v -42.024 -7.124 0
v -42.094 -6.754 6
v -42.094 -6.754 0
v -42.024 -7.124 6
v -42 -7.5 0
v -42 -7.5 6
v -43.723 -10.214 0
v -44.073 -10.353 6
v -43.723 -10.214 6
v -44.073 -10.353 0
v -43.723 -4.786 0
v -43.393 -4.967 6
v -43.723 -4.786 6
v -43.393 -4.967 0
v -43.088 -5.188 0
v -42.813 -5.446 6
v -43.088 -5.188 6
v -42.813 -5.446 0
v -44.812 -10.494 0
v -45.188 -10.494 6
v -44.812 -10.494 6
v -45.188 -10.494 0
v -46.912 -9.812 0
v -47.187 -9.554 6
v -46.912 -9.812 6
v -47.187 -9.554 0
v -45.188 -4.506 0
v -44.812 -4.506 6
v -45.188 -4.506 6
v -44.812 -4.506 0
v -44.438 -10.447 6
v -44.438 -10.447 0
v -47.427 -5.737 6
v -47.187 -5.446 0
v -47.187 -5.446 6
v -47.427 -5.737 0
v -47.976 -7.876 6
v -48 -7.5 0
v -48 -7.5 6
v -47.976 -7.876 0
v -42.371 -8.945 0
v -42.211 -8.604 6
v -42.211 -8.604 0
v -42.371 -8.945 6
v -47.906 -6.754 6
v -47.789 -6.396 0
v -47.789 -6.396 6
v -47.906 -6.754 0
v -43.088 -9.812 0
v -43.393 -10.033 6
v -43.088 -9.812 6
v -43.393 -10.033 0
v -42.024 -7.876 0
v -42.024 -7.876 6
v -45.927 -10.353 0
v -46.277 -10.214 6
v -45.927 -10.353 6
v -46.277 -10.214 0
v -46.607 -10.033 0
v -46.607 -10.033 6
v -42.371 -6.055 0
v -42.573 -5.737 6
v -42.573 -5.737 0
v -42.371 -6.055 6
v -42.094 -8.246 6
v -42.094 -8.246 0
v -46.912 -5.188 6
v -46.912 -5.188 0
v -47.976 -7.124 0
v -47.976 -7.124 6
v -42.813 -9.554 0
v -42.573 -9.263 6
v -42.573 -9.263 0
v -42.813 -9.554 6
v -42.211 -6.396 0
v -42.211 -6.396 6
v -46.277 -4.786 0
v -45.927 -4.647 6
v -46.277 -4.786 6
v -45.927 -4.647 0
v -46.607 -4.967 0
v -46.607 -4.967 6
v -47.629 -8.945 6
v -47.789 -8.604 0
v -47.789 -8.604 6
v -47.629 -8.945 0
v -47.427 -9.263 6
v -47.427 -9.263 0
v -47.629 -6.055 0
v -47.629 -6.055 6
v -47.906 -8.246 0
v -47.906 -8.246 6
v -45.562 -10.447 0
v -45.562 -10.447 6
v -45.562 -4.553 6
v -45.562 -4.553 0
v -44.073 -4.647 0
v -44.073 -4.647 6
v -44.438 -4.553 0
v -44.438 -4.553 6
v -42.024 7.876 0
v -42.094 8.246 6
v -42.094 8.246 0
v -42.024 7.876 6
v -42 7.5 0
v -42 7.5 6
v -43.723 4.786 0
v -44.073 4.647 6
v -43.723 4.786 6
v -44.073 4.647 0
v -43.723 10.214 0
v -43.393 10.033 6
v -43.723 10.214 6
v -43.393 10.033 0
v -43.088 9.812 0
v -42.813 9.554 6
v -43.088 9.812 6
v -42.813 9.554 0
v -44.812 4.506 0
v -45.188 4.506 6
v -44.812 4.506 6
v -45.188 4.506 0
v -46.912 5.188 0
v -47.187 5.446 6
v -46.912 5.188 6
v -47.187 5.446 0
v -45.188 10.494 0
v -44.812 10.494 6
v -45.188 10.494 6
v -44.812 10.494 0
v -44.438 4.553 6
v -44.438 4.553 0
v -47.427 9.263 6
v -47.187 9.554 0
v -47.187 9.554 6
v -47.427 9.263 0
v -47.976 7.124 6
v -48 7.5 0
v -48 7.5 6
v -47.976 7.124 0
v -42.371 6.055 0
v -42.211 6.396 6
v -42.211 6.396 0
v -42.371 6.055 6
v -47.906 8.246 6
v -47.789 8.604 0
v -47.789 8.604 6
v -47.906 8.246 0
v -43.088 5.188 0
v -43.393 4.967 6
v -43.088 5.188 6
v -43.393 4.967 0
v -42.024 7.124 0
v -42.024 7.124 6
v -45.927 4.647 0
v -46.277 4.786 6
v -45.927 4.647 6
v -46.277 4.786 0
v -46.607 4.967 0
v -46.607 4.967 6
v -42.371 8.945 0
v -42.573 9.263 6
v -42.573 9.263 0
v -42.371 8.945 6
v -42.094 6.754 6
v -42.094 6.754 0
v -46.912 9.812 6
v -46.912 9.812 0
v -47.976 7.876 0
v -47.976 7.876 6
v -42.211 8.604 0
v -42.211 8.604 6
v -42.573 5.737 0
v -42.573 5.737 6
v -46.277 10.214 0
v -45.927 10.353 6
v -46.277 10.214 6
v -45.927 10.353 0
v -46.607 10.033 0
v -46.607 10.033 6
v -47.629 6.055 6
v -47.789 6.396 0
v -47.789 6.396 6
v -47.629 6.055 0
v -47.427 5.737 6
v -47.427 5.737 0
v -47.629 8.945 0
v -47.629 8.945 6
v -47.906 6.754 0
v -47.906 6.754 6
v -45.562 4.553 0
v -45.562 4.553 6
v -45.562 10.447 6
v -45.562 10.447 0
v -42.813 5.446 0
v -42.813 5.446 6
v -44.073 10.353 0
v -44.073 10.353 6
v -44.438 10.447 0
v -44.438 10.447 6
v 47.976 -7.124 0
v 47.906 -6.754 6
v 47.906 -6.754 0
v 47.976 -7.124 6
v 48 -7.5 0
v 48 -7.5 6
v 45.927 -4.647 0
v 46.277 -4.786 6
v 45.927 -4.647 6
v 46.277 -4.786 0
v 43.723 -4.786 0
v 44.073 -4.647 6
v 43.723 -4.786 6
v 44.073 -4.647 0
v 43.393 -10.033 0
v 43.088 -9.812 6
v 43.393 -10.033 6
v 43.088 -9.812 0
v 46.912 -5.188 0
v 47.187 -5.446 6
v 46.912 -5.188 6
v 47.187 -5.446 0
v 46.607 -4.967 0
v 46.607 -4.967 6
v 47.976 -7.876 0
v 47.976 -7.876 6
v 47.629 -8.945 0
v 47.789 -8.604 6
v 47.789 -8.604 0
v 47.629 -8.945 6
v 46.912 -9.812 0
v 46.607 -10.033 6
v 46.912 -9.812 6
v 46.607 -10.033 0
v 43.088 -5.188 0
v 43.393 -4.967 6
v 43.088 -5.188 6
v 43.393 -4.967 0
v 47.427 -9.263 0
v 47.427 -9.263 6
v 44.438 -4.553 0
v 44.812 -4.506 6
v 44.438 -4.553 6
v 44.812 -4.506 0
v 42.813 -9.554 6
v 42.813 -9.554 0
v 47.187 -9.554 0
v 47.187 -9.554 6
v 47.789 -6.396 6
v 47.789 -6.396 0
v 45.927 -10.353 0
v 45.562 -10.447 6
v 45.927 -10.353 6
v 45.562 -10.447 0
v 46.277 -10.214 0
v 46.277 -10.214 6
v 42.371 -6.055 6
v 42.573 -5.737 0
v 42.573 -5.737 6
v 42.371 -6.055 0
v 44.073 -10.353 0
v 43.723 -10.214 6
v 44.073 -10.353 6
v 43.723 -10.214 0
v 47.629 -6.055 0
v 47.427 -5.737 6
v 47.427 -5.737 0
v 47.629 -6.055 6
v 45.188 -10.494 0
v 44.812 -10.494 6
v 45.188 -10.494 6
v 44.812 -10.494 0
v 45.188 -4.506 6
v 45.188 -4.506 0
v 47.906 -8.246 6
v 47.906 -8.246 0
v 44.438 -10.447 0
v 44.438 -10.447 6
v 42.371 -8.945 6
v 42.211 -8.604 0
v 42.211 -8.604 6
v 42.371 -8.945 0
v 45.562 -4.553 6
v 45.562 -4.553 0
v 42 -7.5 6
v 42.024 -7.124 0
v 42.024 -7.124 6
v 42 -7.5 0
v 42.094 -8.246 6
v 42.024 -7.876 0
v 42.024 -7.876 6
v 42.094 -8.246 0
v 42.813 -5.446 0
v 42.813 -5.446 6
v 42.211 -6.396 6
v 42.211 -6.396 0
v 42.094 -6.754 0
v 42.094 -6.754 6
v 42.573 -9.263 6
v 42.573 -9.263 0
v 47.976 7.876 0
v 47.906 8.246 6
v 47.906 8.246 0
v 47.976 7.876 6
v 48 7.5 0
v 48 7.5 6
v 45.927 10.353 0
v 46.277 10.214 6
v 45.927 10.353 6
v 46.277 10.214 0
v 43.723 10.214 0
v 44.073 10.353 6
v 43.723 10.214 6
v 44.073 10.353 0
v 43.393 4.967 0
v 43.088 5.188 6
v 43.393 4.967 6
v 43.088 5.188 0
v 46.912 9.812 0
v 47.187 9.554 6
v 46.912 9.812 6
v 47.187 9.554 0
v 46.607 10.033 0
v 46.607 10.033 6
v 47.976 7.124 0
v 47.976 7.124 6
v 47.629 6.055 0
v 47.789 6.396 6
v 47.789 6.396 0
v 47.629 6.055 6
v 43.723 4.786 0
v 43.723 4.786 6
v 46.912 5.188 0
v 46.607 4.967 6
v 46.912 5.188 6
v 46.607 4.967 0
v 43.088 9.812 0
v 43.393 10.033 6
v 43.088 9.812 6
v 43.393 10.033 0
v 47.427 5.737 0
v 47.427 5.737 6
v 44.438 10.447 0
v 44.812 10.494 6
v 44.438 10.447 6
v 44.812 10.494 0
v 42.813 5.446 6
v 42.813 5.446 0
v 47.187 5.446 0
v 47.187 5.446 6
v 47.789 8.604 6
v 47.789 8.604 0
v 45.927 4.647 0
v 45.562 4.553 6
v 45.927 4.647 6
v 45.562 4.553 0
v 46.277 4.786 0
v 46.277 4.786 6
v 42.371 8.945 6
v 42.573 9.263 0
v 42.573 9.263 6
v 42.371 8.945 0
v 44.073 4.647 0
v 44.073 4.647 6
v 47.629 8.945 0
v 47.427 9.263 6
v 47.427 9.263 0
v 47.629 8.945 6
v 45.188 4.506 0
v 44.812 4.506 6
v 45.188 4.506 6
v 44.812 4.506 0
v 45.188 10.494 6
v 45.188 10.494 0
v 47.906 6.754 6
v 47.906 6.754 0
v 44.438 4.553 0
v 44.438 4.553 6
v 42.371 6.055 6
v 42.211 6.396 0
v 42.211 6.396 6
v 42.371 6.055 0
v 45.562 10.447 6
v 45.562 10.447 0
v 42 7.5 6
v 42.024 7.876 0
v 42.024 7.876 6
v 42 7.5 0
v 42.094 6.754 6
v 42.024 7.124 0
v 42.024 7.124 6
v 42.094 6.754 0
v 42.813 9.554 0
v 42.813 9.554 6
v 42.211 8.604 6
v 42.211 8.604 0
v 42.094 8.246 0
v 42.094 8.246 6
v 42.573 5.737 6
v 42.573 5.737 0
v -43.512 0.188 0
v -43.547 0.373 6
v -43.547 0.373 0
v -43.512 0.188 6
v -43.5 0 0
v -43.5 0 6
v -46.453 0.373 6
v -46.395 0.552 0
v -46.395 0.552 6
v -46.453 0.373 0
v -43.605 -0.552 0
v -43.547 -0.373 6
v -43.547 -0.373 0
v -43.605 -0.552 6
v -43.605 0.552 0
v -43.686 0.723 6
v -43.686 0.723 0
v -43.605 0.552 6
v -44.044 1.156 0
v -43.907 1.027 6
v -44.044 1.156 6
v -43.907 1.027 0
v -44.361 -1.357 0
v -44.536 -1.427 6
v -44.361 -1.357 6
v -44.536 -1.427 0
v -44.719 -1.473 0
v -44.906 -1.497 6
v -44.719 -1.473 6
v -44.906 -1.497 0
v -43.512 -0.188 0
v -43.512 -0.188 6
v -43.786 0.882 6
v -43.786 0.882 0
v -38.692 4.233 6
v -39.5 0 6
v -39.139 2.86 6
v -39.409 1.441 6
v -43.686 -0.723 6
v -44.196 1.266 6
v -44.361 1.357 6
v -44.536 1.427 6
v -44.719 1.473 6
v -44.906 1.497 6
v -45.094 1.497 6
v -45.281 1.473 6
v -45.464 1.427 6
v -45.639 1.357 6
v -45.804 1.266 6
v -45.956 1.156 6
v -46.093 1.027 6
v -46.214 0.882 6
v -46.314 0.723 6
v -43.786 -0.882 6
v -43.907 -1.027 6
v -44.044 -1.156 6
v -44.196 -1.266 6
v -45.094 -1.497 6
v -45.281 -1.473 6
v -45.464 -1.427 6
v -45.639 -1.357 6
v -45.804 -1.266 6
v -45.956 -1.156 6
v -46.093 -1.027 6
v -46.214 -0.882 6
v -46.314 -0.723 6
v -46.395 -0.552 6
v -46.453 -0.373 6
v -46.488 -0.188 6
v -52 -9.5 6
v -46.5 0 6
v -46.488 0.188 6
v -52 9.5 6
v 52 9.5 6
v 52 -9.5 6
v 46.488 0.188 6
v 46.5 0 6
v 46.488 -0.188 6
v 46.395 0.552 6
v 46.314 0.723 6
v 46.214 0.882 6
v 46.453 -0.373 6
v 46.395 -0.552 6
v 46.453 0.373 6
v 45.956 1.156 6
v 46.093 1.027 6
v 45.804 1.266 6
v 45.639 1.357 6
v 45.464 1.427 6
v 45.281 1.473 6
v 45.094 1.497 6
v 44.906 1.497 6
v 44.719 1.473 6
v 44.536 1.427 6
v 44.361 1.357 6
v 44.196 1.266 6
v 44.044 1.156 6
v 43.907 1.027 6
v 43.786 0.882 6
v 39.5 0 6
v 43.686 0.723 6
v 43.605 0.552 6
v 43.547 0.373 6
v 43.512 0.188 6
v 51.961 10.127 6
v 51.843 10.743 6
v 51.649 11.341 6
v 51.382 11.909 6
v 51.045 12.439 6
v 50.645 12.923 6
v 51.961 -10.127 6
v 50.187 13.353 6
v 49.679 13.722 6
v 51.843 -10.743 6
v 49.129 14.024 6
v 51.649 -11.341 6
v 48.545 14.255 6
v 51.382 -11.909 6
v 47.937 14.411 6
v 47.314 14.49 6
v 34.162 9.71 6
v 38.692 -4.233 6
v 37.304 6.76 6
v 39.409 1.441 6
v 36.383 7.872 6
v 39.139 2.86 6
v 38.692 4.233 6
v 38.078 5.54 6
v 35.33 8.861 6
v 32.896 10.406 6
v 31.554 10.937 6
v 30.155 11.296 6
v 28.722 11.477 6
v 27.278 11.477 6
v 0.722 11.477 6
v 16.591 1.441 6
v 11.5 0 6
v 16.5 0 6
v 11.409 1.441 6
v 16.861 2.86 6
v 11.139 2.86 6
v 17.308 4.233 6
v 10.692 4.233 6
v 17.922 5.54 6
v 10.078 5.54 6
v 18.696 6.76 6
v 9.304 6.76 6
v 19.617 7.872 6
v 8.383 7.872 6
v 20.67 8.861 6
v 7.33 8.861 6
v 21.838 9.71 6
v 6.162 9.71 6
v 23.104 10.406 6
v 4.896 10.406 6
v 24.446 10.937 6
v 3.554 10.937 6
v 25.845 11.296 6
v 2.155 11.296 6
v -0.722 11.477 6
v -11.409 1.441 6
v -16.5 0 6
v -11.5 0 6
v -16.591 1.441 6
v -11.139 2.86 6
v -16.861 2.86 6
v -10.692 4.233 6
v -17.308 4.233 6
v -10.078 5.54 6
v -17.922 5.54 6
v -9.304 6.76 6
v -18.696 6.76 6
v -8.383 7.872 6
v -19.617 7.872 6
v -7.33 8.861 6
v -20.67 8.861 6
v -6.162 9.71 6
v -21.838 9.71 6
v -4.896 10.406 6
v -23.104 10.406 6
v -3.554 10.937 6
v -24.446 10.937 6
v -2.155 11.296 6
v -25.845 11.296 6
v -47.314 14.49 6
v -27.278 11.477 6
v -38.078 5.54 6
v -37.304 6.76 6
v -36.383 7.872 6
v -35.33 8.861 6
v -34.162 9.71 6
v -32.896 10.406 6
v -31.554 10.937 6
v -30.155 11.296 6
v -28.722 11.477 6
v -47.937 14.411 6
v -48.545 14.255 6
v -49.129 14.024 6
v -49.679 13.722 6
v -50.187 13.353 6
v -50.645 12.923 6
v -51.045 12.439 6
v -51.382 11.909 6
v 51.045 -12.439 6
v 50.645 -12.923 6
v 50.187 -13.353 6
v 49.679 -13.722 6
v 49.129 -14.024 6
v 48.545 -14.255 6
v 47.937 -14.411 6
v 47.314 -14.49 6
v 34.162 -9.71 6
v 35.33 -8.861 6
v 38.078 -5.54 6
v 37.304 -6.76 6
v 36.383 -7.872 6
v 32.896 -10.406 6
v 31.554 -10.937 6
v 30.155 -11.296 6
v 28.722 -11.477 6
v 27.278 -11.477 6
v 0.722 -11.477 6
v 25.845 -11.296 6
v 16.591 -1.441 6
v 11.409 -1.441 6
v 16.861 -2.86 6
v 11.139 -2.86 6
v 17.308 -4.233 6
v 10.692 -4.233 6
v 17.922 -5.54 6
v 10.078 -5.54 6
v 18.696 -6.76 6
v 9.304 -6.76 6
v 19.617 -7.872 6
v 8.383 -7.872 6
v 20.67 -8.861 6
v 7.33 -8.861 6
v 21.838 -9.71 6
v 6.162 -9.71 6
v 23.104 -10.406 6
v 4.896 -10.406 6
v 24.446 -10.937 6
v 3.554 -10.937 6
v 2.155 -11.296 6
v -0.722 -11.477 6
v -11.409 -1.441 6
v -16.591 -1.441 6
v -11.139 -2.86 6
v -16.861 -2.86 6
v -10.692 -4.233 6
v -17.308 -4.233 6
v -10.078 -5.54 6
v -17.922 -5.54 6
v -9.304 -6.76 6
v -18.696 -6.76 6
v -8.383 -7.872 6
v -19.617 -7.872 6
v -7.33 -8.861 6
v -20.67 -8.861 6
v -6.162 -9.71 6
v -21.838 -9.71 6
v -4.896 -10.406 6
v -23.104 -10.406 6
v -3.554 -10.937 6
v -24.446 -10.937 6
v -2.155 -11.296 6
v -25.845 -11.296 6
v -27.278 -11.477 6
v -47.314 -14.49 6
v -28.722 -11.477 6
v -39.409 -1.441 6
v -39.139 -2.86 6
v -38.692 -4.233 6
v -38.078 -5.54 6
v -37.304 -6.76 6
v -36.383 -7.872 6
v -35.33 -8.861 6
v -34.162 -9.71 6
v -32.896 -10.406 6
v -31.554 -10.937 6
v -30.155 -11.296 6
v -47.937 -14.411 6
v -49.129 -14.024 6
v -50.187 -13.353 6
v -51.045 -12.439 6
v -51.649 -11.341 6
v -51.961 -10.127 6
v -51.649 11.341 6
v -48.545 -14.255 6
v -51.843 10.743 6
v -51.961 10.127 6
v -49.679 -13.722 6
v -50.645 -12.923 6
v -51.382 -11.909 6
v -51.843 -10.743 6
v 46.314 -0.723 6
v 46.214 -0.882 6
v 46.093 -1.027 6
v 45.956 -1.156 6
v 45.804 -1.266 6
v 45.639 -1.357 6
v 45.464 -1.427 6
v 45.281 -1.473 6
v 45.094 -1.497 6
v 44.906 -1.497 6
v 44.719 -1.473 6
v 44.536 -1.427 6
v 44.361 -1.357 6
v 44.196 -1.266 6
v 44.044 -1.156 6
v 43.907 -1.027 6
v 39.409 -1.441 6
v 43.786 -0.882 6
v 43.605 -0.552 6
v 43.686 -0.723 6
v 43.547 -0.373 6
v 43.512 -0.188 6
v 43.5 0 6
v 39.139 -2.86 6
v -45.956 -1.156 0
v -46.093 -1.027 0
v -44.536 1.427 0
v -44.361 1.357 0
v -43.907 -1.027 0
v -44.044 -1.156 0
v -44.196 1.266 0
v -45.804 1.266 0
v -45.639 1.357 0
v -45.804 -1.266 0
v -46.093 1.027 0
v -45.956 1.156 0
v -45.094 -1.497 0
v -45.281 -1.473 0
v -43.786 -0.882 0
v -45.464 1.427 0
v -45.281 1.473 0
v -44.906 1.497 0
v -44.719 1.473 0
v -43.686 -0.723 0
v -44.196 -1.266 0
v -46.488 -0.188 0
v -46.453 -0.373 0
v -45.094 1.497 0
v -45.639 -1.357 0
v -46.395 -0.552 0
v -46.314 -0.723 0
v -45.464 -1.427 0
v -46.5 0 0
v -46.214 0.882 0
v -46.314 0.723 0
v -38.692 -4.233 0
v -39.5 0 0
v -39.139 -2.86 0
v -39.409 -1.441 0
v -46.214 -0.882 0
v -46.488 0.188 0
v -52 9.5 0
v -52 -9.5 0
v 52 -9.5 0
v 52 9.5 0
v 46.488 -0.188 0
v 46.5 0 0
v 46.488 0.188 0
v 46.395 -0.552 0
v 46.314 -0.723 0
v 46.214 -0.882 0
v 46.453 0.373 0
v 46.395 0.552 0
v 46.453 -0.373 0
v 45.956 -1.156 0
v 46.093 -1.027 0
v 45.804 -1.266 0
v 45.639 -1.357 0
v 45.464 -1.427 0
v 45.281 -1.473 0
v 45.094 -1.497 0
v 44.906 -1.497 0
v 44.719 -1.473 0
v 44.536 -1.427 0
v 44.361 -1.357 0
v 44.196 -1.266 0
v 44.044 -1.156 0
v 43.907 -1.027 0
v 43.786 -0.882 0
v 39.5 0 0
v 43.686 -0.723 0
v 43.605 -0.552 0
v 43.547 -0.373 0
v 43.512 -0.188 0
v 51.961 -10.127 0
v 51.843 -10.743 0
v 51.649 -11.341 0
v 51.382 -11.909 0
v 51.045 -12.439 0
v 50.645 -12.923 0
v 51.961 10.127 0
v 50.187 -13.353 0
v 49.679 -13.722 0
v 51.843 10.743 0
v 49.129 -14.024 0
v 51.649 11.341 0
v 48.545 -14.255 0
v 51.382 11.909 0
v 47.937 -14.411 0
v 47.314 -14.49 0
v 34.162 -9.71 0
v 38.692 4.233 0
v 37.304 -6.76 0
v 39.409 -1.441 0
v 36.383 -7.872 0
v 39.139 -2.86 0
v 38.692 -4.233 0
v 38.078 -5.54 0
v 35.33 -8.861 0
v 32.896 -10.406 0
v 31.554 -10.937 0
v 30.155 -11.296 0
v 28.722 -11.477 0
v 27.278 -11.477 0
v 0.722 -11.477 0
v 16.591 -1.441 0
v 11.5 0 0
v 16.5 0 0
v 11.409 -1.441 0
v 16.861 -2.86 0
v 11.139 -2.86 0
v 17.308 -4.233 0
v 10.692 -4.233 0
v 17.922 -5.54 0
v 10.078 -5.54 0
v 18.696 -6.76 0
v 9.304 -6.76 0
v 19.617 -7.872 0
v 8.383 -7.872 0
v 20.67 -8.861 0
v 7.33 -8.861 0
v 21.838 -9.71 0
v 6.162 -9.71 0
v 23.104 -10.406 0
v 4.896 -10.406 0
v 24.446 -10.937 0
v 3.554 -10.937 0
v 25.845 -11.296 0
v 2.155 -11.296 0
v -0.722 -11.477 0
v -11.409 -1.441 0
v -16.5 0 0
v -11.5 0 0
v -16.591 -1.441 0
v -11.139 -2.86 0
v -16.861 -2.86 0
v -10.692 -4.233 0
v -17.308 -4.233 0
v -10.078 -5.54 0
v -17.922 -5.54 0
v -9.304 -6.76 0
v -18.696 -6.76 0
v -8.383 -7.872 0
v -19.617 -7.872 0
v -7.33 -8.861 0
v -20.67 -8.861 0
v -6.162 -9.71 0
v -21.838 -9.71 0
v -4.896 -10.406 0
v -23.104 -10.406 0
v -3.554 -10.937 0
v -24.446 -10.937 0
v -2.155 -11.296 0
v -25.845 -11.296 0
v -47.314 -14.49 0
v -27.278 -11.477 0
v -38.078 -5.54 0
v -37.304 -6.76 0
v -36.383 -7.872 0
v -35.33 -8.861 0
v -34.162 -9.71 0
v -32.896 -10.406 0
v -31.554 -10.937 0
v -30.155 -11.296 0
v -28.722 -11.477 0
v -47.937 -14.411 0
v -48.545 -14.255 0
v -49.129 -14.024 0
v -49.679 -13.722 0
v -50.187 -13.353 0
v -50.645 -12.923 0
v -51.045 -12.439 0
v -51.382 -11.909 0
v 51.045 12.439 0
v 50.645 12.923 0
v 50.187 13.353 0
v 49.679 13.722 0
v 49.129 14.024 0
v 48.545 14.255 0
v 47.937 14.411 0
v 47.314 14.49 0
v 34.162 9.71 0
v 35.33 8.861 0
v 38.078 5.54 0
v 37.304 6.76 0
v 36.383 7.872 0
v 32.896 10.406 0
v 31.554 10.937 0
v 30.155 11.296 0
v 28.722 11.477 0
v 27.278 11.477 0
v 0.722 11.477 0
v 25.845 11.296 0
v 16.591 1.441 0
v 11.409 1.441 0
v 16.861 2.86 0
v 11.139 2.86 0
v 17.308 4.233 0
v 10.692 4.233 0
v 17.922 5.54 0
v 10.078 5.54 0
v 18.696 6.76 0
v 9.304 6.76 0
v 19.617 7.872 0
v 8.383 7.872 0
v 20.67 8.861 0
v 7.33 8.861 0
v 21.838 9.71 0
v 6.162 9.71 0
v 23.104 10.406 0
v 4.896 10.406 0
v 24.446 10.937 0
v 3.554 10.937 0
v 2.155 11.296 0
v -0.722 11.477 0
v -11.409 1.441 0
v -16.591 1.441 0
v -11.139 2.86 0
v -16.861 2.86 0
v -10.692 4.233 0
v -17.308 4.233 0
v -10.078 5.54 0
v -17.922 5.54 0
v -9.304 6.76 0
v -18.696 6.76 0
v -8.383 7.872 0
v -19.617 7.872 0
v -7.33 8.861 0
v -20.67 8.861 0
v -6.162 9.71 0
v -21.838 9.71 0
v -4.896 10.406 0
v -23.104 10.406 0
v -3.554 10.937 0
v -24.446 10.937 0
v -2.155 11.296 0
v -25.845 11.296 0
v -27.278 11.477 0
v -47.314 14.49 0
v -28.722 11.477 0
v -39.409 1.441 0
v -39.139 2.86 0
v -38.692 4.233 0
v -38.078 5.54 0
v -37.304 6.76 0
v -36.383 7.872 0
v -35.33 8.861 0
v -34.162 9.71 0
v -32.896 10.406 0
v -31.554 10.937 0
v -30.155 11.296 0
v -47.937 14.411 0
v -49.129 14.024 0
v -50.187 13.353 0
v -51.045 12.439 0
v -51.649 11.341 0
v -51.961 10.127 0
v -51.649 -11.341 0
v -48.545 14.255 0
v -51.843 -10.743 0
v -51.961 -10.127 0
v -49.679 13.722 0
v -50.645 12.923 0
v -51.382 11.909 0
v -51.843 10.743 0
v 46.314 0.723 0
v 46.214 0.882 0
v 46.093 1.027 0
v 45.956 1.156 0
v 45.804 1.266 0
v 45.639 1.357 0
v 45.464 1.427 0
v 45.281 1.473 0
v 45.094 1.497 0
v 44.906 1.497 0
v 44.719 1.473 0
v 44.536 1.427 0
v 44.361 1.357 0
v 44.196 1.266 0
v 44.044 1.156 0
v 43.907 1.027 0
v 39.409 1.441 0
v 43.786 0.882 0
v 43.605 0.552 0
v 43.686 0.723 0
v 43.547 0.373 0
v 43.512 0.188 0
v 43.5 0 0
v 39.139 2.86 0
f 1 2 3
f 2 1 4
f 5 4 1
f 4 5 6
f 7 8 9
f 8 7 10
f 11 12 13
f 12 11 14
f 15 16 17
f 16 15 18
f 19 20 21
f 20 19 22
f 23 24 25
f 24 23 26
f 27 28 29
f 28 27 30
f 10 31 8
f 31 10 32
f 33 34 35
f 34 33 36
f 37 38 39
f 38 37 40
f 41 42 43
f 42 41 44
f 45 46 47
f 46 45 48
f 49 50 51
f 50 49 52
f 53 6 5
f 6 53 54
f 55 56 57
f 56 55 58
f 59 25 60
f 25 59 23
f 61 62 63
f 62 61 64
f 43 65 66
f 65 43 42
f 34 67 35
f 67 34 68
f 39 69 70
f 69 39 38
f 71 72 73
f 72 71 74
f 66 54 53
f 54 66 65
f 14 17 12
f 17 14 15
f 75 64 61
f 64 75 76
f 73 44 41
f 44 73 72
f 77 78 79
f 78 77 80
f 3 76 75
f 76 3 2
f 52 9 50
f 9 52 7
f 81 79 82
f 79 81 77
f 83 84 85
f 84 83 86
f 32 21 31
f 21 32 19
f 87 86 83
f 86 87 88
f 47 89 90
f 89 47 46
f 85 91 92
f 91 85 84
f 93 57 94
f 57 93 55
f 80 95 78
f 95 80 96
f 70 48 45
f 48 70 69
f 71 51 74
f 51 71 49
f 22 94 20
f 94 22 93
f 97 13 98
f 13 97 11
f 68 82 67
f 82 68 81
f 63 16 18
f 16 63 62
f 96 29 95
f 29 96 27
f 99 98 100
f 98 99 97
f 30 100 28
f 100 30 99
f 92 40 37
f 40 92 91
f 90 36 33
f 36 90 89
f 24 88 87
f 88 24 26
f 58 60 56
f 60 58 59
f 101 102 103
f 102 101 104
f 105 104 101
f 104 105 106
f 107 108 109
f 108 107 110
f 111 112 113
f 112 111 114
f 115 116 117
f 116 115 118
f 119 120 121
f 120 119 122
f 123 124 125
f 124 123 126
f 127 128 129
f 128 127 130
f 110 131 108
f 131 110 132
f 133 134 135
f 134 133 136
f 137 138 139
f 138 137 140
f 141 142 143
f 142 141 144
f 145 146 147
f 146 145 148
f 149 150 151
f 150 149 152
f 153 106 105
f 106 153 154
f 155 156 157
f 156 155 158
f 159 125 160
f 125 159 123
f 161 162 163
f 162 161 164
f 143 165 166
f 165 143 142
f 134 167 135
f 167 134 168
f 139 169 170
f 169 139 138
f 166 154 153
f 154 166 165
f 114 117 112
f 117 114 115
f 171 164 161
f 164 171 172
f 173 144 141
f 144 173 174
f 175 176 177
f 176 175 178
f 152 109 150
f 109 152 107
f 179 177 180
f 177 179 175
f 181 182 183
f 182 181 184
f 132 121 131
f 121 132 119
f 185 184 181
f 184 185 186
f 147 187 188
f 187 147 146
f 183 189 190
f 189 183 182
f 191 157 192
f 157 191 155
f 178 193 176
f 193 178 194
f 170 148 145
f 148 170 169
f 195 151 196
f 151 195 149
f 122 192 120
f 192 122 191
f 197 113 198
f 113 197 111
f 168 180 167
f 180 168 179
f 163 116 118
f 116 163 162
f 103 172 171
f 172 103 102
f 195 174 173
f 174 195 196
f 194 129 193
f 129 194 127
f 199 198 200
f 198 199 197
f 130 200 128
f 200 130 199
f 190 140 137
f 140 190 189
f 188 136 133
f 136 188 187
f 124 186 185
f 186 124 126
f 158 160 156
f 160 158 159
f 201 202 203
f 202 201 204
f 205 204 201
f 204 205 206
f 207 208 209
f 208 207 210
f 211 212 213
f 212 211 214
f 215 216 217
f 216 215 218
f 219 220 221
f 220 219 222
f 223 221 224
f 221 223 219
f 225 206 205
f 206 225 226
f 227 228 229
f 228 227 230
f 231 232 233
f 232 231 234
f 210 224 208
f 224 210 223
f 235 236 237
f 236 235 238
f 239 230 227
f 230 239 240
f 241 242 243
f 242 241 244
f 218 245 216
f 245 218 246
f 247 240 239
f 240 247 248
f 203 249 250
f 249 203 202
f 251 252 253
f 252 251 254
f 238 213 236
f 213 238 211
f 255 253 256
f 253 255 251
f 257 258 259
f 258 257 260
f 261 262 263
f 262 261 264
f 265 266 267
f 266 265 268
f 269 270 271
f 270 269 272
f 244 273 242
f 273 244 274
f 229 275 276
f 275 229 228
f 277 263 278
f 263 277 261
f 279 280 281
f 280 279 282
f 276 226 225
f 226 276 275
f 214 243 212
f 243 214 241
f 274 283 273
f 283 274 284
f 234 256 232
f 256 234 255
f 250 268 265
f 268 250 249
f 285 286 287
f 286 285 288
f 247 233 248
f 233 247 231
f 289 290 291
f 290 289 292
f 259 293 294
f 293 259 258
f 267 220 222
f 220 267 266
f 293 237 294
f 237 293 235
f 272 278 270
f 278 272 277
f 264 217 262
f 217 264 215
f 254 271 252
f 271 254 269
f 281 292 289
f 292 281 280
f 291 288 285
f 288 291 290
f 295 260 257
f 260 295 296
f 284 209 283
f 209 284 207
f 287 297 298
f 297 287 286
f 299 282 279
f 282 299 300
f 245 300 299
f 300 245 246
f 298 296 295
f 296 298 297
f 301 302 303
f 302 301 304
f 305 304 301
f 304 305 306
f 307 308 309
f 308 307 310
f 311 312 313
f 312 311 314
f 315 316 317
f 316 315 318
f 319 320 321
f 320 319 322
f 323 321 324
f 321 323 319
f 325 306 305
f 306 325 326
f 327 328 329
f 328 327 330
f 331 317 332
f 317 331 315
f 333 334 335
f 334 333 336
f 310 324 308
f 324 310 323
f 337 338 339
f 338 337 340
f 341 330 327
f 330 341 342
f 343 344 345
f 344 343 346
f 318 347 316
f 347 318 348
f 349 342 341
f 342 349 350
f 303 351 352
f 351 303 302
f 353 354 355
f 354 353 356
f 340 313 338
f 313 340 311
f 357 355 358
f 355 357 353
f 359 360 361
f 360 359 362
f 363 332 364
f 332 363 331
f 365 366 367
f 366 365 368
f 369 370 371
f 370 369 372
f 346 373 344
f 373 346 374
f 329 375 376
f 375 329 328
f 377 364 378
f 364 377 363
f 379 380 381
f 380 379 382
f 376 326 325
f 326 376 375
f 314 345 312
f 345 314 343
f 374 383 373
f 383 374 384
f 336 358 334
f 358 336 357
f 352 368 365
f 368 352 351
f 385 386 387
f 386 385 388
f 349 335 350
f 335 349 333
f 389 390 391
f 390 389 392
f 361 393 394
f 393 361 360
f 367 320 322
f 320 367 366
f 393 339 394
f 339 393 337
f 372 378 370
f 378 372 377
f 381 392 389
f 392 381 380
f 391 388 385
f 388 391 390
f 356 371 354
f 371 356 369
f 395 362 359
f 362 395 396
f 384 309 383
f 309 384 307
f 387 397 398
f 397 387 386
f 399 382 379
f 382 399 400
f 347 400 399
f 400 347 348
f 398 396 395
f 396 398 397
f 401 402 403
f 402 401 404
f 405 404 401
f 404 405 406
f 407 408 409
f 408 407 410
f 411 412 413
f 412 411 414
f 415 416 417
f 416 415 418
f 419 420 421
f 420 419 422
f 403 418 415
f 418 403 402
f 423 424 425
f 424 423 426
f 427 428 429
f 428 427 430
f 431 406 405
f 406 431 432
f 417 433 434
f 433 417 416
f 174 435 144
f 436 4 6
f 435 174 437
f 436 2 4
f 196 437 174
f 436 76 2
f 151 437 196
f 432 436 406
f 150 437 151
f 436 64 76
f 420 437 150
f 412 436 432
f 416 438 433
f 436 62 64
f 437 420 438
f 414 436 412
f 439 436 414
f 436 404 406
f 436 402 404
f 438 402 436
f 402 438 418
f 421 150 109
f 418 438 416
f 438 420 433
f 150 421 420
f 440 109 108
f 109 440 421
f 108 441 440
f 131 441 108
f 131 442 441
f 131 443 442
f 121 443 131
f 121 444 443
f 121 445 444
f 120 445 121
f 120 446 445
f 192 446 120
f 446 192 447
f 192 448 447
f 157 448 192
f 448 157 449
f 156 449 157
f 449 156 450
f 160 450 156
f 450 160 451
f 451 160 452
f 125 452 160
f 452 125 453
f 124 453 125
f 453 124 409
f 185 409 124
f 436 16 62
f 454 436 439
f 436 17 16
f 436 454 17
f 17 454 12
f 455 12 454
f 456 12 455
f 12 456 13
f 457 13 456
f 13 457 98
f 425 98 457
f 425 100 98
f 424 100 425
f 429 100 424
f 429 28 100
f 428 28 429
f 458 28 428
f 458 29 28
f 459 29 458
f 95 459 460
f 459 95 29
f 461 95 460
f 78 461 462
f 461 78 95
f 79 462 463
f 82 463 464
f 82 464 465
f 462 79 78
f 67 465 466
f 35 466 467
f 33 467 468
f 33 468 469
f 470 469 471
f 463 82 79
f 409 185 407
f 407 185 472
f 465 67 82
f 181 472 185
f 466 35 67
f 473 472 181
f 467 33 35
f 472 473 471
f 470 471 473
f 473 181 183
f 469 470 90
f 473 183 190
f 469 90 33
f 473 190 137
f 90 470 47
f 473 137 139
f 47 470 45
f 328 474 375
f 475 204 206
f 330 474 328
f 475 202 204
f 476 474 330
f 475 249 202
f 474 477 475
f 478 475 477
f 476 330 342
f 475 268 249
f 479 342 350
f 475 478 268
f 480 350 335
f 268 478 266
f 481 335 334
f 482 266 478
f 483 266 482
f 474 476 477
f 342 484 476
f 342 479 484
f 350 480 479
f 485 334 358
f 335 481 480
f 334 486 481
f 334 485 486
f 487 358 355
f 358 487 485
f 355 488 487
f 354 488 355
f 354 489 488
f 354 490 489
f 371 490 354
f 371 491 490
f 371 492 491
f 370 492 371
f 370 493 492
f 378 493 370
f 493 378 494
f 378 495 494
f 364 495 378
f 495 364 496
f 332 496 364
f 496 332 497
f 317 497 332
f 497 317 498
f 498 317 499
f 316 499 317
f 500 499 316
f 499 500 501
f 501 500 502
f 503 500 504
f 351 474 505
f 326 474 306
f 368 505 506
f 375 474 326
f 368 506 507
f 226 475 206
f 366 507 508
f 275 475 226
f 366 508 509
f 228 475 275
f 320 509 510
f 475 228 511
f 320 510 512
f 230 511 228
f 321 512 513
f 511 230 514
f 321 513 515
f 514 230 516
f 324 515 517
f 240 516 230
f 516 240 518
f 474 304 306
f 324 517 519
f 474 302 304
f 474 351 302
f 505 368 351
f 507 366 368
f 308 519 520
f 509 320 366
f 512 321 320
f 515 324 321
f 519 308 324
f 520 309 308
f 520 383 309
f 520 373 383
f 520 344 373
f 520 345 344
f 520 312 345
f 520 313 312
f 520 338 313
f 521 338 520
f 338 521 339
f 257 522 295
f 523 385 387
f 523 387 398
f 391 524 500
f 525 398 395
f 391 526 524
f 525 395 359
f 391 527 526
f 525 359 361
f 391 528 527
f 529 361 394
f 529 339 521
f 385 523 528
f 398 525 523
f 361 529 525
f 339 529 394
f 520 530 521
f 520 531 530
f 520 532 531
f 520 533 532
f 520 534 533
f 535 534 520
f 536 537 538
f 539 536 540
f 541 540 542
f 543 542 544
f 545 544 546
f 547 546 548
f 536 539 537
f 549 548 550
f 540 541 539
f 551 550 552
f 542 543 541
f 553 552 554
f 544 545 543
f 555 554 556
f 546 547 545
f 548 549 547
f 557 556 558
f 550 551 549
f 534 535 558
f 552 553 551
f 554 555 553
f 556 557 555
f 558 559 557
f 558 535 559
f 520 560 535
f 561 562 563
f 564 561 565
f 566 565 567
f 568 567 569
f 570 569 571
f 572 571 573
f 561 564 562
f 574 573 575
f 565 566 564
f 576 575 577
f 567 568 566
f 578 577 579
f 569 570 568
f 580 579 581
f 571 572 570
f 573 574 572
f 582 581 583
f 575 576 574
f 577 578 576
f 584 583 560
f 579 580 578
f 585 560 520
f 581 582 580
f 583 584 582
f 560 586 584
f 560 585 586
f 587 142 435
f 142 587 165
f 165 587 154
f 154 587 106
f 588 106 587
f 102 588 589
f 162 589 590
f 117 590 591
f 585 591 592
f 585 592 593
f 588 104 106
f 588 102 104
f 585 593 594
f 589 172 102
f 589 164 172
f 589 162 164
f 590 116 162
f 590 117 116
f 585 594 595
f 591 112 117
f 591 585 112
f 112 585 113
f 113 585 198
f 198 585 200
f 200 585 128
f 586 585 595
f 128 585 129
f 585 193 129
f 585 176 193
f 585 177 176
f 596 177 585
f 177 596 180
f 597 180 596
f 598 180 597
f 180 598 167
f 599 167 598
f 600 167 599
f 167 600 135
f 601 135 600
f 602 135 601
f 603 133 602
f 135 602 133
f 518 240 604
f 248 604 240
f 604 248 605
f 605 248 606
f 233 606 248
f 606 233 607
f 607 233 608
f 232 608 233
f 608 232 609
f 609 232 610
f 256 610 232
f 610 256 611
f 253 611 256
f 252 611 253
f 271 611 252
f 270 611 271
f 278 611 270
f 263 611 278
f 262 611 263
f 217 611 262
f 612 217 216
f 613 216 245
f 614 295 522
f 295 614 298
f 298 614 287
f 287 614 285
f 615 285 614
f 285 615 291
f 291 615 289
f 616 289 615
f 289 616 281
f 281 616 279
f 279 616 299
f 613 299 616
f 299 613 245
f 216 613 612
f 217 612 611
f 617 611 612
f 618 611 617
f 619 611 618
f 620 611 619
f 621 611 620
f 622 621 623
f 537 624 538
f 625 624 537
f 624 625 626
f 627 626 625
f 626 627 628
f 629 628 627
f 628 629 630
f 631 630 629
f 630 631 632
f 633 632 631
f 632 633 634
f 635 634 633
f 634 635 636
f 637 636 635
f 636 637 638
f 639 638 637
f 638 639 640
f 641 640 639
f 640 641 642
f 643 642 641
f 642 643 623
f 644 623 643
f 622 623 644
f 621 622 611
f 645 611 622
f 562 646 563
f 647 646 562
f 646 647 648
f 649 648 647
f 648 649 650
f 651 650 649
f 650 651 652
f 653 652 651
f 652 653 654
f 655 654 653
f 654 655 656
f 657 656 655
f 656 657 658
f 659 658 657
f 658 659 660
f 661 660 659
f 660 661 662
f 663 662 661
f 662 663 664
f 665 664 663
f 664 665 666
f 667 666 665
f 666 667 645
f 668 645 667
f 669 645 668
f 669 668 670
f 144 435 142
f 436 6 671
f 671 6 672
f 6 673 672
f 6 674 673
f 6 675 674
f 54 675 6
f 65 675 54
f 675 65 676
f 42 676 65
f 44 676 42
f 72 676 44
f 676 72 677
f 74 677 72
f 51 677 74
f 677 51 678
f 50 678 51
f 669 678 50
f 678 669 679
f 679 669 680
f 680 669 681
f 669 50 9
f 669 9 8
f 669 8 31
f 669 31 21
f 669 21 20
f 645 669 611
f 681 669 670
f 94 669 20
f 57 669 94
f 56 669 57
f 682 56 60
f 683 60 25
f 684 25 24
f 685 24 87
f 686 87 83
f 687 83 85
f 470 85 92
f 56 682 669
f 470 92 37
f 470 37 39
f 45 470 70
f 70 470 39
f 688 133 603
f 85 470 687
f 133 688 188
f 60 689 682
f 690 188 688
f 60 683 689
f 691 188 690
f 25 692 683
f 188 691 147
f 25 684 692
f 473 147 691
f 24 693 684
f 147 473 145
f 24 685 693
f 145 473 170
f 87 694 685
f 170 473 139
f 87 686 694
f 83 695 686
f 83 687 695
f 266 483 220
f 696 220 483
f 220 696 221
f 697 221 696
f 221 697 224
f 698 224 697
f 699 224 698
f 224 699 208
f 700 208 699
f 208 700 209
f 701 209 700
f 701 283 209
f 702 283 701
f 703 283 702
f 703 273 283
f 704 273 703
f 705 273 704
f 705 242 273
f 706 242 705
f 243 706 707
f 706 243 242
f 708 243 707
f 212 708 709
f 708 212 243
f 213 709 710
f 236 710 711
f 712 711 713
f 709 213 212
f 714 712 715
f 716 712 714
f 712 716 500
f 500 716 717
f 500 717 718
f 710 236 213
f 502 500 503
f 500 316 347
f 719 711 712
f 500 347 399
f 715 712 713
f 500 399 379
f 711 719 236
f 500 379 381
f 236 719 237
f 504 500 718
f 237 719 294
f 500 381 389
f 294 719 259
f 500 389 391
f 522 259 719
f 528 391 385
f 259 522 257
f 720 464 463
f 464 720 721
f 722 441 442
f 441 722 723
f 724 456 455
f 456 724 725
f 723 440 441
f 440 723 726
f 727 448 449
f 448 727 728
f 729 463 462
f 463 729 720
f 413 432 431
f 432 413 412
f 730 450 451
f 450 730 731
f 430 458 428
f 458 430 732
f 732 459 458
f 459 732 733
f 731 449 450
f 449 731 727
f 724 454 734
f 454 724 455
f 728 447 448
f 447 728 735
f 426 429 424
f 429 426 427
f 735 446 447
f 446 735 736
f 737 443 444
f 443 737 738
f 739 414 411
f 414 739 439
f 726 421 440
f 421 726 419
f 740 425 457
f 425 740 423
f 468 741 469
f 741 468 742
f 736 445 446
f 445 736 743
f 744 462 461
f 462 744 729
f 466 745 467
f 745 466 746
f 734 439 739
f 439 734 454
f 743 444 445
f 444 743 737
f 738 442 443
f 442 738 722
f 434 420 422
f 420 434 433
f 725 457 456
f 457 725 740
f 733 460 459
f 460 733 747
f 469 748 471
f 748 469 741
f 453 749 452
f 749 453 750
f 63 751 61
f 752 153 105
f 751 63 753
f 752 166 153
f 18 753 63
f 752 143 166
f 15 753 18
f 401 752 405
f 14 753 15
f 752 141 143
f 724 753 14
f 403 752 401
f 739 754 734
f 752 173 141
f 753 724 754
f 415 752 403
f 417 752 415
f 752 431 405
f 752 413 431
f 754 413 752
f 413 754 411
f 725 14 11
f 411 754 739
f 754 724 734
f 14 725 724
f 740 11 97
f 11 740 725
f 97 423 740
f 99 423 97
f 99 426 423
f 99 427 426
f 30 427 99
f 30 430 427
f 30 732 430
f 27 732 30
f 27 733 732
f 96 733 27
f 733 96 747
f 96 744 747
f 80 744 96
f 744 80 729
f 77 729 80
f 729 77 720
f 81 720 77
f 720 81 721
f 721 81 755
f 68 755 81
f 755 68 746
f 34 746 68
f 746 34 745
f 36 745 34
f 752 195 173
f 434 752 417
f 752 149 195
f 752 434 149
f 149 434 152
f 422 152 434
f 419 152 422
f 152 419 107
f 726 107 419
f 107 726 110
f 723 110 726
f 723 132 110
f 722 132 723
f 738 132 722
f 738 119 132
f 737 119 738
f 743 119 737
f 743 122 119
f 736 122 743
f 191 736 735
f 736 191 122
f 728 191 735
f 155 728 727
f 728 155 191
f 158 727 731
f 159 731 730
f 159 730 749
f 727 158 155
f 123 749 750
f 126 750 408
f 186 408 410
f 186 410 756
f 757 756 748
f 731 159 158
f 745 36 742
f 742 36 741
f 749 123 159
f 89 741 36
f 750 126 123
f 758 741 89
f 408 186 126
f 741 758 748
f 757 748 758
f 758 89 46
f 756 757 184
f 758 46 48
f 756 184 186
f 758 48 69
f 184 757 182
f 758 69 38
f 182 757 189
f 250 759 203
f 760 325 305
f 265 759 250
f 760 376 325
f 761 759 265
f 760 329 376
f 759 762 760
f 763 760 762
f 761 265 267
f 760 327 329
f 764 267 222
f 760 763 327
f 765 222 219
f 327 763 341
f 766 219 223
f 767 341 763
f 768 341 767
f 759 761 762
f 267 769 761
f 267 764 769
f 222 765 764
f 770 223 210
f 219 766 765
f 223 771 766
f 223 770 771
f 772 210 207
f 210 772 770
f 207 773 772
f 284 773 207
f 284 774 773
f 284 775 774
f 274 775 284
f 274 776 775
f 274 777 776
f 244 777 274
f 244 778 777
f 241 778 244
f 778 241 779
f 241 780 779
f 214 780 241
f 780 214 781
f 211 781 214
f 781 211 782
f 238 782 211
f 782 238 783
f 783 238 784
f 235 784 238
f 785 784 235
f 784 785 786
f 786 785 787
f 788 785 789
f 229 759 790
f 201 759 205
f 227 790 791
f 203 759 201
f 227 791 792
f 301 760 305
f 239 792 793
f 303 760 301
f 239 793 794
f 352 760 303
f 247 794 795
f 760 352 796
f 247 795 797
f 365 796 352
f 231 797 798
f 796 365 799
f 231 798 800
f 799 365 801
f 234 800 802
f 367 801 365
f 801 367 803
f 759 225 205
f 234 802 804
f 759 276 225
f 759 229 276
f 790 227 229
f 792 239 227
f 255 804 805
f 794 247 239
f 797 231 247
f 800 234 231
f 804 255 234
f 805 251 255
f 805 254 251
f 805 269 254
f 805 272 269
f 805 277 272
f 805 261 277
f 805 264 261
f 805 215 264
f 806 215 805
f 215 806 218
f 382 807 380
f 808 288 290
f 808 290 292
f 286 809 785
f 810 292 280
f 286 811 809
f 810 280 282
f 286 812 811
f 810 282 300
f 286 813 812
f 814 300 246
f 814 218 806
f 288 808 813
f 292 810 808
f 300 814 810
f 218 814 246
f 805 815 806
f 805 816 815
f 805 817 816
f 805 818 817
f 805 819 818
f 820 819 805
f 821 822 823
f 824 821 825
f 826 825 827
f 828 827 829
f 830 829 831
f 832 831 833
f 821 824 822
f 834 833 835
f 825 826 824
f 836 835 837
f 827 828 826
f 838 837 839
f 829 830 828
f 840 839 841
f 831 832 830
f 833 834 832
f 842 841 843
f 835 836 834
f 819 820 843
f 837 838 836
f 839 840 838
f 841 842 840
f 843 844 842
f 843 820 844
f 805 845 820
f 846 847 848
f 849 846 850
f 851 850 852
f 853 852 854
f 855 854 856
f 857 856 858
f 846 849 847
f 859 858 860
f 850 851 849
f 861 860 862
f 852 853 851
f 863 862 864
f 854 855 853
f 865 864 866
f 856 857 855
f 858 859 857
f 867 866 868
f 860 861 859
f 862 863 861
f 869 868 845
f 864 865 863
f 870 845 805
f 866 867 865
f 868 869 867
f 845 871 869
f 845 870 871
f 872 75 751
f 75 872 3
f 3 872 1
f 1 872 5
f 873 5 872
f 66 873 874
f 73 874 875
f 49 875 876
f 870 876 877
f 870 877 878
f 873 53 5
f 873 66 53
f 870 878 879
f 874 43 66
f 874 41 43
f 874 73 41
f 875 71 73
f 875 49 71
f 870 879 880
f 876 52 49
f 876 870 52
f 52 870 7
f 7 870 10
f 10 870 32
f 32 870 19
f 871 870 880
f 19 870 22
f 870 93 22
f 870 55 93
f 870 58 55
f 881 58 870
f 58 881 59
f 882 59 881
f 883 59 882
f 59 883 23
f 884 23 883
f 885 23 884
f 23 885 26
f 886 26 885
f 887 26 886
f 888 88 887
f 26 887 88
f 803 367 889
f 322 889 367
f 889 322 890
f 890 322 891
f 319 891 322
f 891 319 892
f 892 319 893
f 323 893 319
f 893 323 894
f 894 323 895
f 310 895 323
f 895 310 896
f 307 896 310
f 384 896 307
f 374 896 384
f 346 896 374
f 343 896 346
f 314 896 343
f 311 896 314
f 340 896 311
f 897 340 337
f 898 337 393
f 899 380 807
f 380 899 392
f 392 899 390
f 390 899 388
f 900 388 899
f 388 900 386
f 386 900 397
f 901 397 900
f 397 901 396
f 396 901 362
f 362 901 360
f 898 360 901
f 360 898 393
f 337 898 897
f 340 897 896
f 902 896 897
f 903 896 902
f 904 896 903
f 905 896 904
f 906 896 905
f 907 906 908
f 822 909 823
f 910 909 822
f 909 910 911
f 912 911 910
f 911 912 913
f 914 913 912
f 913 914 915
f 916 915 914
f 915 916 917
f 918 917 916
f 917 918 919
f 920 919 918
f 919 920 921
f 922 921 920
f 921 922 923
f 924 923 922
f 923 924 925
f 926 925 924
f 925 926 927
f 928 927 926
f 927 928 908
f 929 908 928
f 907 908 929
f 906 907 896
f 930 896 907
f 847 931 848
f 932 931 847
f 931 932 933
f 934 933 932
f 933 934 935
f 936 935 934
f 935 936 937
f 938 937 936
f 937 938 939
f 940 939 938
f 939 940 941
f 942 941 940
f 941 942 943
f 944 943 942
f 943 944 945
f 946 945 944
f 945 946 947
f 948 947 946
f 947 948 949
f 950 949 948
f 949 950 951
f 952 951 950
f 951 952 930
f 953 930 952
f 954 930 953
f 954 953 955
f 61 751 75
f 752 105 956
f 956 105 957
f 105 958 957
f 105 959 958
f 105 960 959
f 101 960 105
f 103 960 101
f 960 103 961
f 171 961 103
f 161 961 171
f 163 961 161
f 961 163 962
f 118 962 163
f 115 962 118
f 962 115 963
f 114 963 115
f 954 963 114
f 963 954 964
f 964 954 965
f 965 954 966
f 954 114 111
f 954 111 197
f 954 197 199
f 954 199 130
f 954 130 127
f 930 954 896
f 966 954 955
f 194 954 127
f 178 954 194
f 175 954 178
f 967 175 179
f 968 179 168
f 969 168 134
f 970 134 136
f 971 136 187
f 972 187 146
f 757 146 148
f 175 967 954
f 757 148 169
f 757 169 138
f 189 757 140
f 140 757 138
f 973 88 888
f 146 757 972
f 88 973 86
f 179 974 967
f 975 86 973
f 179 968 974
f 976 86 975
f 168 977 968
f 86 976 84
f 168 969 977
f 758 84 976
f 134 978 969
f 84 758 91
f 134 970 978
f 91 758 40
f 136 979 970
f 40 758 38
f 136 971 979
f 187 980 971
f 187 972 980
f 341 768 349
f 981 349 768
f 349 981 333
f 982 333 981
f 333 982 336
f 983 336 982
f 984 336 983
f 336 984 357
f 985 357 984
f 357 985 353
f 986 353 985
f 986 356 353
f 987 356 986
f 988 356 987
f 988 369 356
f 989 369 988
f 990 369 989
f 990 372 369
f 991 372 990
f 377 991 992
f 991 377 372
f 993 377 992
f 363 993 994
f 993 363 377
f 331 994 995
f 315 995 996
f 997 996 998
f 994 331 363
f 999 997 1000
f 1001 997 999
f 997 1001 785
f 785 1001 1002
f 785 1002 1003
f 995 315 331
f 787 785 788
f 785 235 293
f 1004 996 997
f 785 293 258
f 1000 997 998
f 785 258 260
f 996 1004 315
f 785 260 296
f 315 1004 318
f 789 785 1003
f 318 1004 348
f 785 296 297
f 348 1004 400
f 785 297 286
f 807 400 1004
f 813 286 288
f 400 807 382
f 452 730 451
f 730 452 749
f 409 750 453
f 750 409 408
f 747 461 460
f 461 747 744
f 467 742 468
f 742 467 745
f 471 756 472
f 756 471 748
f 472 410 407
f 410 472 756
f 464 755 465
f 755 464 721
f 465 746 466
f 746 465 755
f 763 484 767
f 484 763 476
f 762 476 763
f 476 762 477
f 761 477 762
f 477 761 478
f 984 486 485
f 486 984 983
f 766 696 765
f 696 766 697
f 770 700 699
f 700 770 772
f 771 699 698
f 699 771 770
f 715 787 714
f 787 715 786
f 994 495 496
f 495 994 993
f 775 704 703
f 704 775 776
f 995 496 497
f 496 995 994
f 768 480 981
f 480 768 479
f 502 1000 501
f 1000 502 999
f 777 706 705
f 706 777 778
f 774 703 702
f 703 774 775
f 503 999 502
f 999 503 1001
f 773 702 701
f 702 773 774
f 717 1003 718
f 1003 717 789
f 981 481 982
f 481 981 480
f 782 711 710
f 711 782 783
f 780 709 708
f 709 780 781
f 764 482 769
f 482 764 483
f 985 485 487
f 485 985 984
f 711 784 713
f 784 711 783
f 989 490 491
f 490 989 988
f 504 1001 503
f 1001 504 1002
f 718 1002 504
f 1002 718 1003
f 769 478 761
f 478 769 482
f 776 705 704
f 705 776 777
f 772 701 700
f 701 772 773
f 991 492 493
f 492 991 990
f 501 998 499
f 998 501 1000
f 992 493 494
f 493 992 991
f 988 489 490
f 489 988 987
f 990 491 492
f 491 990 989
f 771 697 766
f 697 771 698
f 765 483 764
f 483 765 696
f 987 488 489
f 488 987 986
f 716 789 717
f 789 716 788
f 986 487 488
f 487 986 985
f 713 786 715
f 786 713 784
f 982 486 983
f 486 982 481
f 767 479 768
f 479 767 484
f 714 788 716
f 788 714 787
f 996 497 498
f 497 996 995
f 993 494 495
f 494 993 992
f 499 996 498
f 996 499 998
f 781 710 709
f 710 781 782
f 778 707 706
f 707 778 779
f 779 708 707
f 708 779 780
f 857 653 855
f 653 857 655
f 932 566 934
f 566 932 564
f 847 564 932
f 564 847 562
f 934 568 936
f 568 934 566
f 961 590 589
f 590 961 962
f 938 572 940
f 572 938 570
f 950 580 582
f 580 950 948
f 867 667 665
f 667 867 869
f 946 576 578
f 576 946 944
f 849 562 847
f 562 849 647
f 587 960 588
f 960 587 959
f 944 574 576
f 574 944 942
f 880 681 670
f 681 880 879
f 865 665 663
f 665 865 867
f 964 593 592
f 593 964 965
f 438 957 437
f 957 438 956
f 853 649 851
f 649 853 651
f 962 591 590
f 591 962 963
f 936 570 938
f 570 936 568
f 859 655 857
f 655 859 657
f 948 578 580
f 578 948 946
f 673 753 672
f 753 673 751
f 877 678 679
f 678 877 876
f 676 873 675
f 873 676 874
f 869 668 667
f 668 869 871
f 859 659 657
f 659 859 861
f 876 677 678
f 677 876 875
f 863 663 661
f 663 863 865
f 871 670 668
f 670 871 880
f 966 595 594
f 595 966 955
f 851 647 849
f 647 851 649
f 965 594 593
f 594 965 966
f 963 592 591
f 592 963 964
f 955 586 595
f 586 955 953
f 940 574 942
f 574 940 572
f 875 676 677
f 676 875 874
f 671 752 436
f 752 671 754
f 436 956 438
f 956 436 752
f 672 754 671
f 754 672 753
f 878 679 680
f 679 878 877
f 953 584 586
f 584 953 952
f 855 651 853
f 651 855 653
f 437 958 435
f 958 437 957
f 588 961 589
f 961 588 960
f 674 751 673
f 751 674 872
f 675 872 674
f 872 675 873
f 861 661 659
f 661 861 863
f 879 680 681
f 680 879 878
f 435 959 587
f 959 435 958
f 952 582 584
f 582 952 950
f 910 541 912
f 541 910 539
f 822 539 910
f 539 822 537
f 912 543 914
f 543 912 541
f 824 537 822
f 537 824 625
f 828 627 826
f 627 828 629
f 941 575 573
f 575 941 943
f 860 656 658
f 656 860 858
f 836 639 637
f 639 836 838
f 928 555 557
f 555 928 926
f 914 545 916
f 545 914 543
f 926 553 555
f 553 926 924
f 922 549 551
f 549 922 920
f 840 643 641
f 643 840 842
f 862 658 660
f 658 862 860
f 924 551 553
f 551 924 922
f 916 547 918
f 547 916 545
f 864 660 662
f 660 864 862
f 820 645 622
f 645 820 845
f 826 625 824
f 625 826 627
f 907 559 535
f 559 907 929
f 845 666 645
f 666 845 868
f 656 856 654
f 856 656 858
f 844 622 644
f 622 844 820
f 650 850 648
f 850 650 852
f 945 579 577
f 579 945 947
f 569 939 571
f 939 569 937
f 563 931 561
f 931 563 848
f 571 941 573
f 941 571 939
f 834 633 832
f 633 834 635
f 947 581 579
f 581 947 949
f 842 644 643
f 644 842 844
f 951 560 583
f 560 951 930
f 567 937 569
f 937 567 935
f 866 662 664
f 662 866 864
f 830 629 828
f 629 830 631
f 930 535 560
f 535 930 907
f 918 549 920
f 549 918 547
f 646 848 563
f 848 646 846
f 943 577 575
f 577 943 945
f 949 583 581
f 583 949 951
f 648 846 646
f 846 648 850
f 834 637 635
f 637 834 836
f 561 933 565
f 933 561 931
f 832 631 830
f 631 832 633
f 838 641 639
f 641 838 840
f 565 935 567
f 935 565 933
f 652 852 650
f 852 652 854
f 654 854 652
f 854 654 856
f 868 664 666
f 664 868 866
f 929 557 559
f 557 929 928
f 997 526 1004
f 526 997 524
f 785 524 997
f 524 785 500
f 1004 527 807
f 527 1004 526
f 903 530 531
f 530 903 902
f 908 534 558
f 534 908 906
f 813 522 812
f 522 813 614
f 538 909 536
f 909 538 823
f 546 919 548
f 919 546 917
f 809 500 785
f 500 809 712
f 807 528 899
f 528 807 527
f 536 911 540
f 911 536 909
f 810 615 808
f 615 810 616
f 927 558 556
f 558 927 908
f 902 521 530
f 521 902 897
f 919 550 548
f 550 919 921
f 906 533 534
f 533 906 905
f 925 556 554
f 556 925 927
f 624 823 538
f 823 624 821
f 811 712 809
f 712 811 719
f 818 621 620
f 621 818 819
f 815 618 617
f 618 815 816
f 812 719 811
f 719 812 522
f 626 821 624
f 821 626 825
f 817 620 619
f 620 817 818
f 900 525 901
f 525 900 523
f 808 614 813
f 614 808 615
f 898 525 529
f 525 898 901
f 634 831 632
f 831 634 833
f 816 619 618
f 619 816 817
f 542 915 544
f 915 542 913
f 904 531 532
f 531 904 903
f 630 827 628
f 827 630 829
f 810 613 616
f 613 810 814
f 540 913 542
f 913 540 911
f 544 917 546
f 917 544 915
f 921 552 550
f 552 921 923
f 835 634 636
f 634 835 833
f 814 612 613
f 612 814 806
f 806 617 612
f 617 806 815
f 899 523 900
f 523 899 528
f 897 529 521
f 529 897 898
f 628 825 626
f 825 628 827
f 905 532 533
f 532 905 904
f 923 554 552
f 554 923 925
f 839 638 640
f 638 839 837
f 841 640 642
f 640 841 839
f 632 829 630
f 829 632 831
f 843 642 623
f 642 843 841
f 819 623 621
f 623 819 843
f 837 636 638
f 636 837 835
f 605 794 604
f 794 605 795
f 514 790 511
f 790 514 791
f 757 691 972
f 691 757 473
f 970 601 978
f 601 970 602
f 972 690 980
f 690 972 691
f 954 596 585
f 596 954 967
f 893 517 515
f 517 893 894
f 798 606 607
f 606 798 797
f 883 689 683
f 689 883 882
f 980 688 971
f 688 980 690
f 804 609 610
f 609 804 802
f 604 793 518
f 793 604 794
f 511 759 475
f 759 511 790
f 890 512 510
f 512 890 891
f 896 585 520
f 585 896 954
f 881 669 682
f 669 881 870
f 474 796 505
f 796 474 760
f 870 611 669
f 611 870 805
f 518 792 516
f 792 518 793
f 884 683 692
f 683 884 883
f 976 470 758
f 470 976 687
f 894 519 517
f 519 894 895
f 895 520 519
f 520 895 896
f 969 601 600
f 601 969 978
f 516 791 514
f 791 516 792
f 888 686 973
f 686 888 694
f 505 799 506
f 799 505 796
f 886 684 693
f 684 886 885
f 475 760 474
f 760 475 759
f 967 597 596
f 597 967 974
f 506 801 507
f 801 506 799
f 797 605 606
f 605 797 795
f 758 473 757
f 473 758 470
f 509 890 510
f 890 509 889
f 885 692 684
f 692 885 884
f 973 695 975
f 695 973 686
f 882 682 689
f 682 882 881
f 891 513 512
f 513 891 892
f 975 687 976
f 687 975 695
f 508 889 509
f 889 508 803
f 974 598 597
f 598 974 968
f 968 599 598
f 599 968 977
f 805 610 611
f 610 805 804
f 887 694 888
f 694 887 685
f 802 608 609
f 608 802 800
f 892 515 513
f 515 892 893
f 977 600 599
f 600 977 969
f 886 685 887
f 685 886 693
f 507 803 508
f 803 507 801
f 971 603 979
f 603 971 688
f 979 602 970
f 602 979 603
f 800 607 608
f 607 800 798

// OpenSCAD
$fn = 50;


difference() {
	union() {
		hull() {
			translate(v = [-47.0000000000, 9.5000000000, 0]) {
				cylinder(h = 6, r = 5);
			}
			translate(v = [47.0000000000, 9.5000000000, 0]) {
				cylinder(h = 6, r = 5);
			}
			translate(v = [-47.0000000000, -9.5000000000, 0]) {
				cylinder(h = 6, r = 5);
			}
			translate(v = [47.0000000000, -9.5000000000, 0]) {
				cylinder(h = 6, r = 5);
			}
		}
	}
	union() {
		#translate(v = [-45.0000000000, -7.5000000000, 0]) {
			cylinder(h = 6, r = 3.0000000000);
		}
		#translate(v = [-45.0000000000, 7.5000000000, 0]) {
			cylinder(h = 6, r = 3.0000000000);
		}
		#translate(v = [45.0000000000, -7.5000000000, 0]) {
			cylinder(h = 6, r = 3.0000000000);
		}
		#translate(v = [45.0000000000, 7.5000000000, 0]) {
			cylinder(h = 6, r = 3.0000000000);
		}
		#translate(v = [-45.0000000000, -7.5000000000, -100.0000000000]) {
			cylinder(h = 200, r = 3.0000000000);
		}
		#translate(v = [-45.0000000000, 7.5000000000, -100.0000000000]) {
			cylinder(h = 200, r = 3.0000000000);
		}
		#translate(v = [45.0000000000, -7.5000000000, -100.0000000000]) {
			cylinder(h = 200, r = 3.0000000000);
		}
		#translate(v = [45.0000000000, 7.5000000000, -100.0000000000]) {
			cylinder(h = 200, r = 3.0000000000);
		}
		#translate(v = [-45.0000000000, -7.5000000000, 0]) {
			cylinder(h = 6, r = 1.5000000000);
		}
		#translate(v = [-45.0000000000, 0.0000000000, 0]) {
			cylinder(h = 6, r = 1.5000000000);
		}
		#translate(v = [-45.0000000000, 7.5000000000, 0]) {
			cylinder(h = 6, r = 1.5000000000);
		}
		#translate(v = [45.0000000000, -7.5000000000, 0]) {
			cylinder(h = 6, r = 1.5000000000);
		}
		#translate(v = [45.0000000000, 0.0000000000, 0]) {
			cylinder(h = 6, r = 1.5000000000);
		}
		#translate(v = [45.0000000000, 7.5000000000, 0]) {
			cylinder(h = 6, r = 1.5000000000);
		}
		#translate(v = [-45.0000000000, -7.5000000000, 0]) {
			cylinder(h = 6, r = 1.5000000000);
		}
		#translate(v = [-45.0000000000, 0.0000000000, 0]) {
			cylinder(h = 6, r = 1.5000000000);
		}
		#translate(v = [-45.0000000000, 7.5000000000, 0]) {
			cylinder(h = 6, r = 1.5000000000);
		}
		#translate(v = [45.0000000000, -7.5000000000, 0]) {
			cylinder(h = 6, r = 1.5000000000);
		}
		#translate(v = [45.0000000000, 0.0000000000, 0]) {
			cylinder(h = 6, r = 1.5000000000);
		}
		#translate(v = [45.0000000000, 7.5000000000, 0]) {
			cylinder(h = 6, r = 1.5000000000);
		}
		#translate(v = [-45.0000000000, -7.5000000000, 0]) {
			cylinder(h = 6, r = 1.5000000000);
		}
		#translate(v = [-45.0000000000, 0.0000000000, 0]) {
			cylinder(h = 6, r = 1.5000000000);
		}
		#translate(v = [-45.0000000000, 7.5000000000, 0]) {
			cylinder(h = 6, r = 1.5000000000);
		}
		#translate(v = [45.0000000000, -7.5000000000, 0]) {
			cylinder(h = 6, r = 1.5000000000);
		}
		#translate(v = [45.0000000000, 0.0000000000, 0]) {
			cylinder(h = 6, r = 1.5000000000);
		}
		#translate(v = [45.0000000000, 7.5000000000, 0]) {
			cylinder(h = 6, r = 1.5000000000);
		}
		#translate(v = [-28.0000000000, 0, 0]) {
			cylinder(h = 6, r = 11.5000000000);
		}
		#cylinder(h = 6, r = 11.5000000000);
		#translate(v = [28.0000000000, 0, 0]) {
			cylinder(h = 6, r = 11.5000000000);
		}
	}
}
